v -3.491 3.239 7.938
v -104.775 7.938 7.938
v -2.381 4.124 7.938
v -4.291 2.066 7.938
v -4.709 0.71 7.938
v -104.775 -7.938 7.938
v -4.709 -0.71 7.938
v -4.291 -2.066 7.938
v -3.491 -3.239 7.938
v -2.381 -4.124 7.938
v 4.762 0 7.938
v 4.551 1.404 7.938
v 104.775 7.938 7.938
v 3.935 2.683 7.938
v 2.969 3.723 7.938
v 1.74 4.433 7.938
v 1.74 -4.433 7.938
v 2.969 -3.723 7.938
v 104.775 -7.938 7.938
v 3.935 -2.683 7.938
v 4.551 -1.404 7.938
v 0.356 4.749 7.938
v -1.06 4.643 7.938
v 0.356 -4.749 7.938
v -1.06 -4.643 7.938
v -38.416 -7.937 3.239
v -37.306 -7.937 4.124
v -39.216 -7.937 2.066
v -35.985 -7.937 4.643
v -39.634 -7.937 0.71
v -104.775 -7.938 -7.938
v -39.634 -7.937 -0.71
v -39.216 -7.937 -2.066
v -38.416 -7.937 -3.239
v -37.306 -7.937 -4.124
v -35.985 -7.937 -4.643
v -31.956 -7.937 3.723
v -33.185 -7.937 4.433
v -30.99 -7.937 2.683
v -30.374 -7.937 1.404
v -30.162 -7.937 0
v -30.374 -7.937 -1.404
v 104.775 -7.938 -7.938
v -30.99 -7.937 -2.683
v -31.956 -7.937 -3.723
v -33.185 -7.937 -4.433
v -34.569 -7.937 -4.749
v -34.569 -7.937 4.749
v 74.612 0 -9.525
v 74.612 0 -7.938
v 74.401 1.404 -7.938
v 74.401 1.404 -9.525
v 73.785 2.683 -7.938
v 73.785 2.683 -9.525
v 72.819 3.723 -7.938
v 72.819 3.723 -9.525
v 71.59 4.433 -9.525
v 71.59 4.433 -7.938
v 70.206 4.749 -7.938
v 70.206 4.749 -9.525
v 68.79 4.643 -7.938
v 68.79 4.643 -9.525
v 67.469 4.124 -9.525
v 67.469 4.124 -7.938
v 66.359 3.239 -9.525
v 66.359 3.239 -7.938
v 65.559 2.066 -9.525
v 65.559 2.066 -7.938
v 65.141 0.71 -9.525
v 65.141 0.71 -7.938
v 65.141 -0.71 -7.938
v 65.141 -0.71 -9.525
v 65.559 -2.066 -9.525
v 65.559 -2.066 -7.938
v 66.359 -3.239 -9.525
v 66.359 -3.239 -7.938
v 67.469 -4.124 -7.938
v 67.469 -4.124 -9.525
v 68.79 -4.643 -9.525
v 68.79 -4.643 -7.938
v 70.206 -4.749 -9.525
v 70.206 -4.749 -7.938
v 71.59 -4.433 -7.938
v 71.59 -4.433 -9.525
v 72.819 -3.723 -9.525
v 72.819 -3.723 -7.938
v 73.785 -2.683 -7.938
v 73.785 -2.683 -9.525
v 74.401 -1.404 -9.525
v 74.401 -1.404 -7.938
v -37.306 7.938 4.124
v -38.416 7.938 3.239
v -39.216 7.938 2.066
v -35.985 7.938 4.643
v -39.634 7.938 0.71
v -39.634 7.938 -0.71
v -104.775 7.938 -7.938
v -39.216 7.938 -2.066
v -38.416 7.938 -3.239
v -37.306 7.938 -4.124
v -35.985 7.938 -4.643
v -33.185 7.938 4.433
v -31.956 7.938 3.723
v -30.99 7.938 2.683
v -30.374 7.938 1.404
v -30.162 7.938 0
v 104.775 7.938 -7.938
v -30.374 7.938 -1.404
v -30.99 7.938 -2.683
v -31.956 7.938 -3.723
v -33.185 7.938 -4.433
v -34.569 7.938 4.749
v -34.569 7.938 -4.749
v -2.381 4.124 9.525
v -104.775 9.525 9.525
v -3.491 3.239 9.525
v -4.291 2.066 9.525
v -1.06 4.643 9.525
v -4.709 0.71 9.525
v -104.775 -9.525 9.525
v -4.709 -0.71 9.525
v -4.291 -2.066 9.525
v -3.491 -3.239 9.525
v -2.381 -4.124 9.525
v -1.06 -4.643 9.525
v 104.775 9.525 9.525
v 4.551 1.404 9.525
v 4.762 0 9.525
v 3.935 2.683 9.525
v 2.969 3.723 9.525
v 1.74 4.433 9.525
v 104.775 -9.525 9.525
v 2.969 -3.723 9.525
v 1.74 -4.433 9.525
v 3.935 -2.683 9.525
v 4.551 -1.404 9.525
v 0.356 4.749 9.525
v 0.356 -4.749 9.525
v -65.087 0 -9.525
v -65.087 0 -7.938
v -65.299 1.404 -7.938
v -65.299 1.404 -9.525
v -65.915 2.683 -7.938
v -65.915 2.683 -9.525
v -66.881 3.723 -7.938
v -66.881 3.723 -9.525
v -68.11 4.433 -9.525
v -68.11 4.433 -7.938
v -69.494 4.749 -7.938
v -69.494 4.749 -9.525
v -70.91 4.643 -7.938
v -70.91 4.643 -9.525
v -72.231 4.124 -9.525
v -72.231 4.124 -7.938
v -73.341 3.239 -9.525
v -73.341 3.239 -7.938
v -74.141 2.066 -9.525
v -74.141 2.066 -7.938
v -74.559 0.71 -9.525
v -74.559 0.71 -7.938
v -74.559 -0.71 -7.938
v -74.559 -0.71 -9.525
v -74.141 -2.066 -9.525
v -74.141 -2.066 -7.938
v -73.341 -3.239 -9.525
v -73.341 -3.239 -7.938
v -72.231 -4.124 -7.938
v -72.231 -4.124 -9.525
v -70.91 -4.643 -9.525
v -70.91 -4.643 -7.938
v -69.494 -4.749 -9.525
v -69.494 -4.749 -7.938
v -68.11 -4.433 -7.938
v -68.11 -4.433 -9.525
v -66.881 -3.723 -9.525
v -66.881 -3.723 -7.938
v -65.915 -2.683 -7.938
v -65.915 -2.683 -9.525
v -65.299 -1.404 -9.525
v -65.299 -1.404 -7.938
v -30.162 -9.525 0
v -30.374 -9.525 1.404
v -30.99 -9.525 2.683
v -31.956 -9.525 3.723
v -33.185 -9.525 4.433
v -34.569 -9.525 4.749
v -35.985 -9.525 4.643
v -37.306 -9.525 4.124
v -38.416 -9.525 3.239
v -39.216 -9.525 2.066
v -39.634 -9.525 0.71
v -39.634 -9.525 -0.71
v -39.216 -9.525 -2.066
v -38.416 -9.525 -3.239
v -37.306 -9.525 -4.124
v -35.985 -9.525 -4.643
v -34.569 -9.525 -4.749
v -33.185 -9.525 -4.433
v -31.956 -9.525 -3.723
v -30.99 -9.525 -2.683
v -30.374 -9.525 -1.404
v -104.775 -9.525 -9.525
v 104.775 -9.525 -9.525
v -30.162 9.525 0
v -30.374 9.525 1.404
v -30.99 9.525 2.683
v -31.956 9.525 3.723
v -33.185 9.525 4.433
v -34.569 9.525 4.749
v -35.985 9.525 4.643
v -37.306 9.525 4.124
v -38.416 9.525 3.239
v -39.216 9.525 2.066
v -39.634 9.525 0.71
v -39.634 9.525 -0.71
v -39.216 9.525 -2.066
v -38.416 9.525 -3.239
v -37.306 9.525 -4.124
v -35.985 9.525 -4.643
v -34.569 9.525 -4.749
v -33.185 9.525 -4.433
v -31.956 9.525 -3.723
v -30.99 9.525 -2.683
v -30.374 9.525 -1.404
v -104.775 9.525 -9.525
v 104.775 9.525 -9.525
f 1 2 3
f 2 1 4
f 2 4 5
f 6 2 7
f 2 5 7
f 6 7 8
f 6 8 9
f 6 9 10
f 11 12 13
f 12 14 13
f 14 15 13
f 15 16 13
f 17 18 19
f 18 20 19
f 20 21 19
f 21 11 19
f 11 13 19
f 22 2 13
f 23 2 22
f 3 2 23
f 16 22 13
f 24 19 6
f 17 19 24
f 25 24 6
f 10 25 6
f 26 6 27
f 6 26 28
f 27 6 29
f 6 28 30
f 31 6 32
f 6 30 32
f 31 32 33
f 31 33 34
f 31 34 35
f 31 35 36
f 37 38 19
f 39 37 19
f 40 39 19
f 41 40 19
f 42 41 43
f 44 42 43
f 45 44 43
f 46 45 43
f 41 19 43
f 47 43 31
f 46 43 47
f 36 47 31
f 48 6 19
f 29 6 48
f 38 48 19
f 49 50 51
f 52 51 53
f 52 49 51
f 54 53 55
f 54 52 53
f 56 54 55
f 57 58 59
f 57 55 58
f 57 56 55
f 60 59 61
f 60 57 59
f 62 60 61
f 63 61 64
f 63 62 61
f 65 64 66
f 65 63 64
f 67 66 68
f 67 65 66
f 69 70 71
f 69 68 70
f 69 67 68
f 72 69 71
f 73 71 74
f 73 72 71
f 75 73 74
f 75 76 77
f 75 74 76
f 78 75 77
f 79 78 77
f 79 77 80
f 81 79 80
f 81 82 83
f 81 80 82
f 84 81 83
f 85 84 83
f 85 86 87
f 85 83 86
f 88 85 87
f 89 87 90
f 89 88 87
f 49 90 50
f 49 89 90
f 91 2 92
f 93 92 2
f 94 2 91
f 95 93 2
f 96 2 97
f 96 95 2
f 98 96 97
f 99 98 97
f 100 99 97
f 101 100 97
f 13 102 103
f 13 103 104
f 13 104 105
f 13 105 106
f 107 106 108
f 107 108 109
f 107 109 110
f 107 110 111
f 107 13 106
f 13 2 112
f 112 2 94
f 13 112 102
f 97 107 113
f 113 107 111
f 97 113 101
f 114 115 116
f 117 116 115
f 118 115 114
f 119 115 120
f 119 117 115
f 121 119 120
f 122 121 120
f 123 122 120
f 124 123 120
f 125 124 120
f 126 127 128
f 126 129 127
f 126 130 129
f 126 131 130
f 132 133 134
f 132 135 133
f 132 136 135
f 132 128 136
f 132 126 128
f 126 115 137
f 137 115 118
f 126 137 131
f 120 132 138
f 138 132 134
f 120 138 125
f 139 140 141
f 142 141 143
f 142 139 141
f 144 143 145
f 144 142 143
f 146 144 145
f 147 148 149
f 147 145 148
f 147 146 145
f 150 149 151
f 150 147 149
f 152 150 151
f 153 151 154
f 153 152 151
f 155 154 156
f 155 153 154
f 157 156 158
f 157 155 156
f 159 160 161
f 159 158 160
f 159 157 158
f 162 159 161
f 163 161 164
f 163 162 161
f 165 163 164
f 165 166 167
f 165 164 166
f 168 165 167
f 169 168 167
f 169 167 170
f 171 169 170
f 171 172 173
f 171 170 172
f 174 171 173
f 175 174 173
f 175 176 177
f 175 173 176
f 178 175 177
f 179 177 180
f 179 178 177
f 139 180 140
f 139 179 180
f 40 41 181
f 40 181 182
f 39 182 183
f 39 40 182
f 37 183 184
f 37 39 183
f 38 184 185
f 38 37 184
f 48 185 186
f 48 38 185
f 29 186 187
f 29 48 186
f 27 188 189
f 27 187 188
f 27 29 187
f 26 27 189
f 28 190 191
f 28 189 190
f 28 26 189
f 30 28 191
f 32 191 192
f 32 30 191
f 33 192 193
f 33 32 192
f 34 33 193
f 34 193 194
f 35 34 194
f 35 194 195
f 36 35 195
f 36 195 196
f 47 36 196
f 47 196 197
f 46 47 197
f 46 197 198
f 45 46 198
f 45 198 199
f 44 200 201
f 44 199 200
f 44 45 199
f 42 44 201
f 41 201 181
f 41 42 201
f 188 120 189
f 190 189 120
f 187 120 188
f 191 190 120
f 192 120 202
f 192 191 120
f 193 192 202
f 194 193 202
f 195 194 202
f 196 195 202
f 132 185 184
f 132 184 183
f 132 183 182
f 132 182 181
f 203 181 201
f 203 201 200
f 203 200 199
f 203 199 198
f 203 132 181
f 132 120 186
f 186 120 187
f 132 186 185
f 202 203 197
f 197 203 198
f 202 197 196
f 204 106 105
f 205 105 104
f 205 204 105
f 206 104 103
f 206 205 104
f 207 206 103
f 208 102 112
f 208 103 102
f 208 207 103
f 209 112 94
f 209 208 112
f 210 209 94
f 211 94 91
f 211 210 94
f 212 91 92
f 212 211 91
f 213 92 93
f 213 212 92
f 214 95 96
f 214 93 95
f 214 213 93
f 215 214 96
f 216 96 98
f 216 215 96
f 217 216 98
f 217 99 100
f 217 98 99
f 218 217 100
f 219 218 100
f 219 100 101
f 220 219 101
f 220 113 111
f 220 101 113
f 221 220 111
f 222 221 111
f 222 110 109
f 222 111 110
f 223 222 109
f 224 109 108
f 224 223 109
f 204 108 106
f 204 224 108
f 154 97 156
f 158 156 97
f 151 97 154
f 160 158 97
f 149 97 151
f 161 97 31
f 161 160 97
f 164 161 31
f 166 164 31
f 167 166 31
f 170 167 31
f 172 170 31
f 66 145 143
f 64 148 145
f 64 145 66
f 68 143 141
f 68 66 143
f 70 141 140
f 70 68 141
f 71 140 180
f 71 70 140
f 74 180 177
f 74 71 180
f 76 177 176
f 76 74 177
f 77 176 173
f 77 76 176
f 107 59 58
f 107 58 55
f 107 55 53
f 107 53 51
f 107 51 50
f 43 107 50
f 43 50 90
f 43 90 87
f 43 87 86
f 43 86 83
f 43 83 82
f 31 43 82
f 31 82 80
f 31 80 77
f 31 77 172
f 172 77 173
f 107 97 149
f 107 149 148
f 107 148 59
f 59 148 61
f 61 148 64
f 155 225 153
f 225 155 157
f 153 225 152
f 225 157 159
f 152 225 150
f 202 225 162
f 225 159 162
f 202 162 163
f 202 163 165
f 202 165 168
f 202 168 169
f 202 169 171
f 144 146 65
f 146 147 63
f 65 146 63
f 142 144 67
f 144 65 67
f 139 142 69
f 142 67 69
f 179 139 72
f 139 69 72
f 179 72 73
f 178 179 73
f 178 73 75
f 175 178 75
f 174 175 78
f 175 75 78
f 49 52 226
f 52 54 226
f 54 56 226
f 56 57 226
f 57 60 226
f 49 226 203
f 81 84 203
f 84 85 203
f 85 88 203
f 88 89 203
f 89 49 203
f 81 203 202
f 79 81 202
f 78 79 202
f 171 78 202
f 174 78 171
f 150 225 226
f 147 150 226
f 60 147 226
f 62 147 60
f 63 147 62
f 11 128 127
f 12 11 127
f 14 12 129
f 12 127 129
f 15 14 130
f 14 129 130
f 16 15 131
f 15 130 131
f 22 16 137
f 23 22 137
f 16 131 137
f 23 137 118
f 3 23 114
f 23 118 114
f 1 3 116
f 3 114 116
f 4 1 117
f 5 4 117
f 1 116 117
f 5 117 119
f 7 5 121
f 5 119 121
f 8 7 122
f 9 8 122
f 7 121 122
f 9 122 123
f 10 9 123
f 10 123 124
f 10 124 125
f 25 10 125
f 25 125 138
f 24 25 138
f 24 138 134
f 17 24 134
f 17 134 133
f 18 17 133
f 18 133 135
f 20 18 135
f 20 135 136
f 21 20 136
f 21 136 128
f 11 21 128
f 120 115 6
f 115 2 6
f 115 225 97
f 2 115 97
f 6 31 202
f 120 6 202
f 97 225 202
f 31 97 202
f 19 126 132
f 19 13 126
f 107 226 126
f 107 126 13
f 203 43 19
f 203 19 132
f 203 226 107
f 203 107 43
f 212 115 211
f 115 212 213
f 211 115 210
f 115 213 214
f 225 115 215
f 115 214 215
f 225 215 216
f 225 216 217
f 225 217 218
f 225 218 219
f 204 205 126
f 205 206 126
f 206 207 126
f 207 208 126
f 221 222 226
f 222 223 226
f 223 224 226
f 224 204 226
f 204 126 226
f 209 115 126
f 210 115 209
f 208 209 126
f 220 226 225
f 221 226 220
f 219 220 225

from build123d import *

# Parameters (mm, degrees)
SKETCH1_W                     = 19.05
SKETCH1_H                     = 19.05
SKETCH1_W_2                   = 15.875
SKETCH1_H_2                   = 15.875
BOSS_EXTRUDE1_DEPTH           = 104.775
POWERSUPPLY_MOUNT_HOLES_REACH = 21.05
SKETCH4_R                     = 4.7625
CUT_EXTRUDE1_REACH            = 21.05
SKETCH5_R                     = 4.7625
SKETCH6_R                     = 4.7625
CUT_EXTRUDE2_DEPTH            = 20.05


with BuildPart() as part:
    # Sketch1 → Boss-Extrude1 (new body, symmetric)
    with BuildSketch(Plane(origin=(0, 0, 0), x_dir=(0, -1, 0), z_dir=(1, 0, 0))):
        Rectangle(SKETCH1_W, SKETCH1_H)
        Rectangle(SKETCH1_W_2, SKETCH1_H_2, mode=Mode.SUBTRACT)
    extrude(amount=BOSS_EXTRUDE1_DEPTH, both=True)

    # Sketch4 → PowerSupply Mount Holes (cut, up to next)
    with BuildSketch(Plane.XY.offset(-9.525), mode=Mode.PRIVATE) as powersupply_mount_holes_sk1:
        with Locations((-69.85, 0)):
            Circle(SKETCH4_R)
    powersupply_mount_holes_tool1 = extrude(powersupply_mount_holes_sk1.sketch, amount=POWERSUPPLY_MOUNT_HOLES_REACH, mode=Mode.PRIVATE) & part.part
    add(powersupply_mount_holes_tool1.solids().sort_by_distance((-69.85, 0, -9.525))[0], mode=Mode.SUBTRACT)
    # Sketch4 → PowerSupply Mount Holes (cut, up to next)
    with BuildSketch(Plane.XY.offset(-9.525), mode=Mode.PRIVATE) as powersupply_mount_holes_sk2:
        with Locations((69.85, 0)):
            Circle(SKETCH4_R)
    powersupply_mount_holes_tool2 = extrude(powersupply_mount_holes_sk2.sketch, amount=POWERSUPPLY_MOUNT_HOLES_REACH, mode=Mode.PRIVATE) & part.part
    add(powersupply_mount_holes_tool2.solids().sort_by_distance((69.85, 0, -9.525))[0], mode=Mode.SUBTRACT)

    # Sketch5 → Cut-Extrude1 (cut, up to next)
    with BuildSketch(Plane.XY.offset(9.525), mode=Mode.PRIVATE) as cut_extrude1_sk1:
        Circle(SKETCH5_R)
    cut_extrude1_tool1 = extrude(cut_extrude1_sk1.sketch, amount=-CUT_EXTRUDE1_REACH, mode=Mode.PRIVATE) & part.part
    add(cut_extrude1_tool1.solids().sort_by_distance((0, 0, 9.525))[0], mode=Mode.SUBTRACT)

    # Sketch6 → Cut-Extrude2 (cut, through all)
    with BuildSketch(Plane.XZ.offset(-9.525)):
        with Locations((-34.925, 0)):
            Circle(SKETCH6_R)
    extrude(amount=CUT_EXTRUDE2_DEPTH, mode=Mode.SUBTRACT)


solid = part.part
